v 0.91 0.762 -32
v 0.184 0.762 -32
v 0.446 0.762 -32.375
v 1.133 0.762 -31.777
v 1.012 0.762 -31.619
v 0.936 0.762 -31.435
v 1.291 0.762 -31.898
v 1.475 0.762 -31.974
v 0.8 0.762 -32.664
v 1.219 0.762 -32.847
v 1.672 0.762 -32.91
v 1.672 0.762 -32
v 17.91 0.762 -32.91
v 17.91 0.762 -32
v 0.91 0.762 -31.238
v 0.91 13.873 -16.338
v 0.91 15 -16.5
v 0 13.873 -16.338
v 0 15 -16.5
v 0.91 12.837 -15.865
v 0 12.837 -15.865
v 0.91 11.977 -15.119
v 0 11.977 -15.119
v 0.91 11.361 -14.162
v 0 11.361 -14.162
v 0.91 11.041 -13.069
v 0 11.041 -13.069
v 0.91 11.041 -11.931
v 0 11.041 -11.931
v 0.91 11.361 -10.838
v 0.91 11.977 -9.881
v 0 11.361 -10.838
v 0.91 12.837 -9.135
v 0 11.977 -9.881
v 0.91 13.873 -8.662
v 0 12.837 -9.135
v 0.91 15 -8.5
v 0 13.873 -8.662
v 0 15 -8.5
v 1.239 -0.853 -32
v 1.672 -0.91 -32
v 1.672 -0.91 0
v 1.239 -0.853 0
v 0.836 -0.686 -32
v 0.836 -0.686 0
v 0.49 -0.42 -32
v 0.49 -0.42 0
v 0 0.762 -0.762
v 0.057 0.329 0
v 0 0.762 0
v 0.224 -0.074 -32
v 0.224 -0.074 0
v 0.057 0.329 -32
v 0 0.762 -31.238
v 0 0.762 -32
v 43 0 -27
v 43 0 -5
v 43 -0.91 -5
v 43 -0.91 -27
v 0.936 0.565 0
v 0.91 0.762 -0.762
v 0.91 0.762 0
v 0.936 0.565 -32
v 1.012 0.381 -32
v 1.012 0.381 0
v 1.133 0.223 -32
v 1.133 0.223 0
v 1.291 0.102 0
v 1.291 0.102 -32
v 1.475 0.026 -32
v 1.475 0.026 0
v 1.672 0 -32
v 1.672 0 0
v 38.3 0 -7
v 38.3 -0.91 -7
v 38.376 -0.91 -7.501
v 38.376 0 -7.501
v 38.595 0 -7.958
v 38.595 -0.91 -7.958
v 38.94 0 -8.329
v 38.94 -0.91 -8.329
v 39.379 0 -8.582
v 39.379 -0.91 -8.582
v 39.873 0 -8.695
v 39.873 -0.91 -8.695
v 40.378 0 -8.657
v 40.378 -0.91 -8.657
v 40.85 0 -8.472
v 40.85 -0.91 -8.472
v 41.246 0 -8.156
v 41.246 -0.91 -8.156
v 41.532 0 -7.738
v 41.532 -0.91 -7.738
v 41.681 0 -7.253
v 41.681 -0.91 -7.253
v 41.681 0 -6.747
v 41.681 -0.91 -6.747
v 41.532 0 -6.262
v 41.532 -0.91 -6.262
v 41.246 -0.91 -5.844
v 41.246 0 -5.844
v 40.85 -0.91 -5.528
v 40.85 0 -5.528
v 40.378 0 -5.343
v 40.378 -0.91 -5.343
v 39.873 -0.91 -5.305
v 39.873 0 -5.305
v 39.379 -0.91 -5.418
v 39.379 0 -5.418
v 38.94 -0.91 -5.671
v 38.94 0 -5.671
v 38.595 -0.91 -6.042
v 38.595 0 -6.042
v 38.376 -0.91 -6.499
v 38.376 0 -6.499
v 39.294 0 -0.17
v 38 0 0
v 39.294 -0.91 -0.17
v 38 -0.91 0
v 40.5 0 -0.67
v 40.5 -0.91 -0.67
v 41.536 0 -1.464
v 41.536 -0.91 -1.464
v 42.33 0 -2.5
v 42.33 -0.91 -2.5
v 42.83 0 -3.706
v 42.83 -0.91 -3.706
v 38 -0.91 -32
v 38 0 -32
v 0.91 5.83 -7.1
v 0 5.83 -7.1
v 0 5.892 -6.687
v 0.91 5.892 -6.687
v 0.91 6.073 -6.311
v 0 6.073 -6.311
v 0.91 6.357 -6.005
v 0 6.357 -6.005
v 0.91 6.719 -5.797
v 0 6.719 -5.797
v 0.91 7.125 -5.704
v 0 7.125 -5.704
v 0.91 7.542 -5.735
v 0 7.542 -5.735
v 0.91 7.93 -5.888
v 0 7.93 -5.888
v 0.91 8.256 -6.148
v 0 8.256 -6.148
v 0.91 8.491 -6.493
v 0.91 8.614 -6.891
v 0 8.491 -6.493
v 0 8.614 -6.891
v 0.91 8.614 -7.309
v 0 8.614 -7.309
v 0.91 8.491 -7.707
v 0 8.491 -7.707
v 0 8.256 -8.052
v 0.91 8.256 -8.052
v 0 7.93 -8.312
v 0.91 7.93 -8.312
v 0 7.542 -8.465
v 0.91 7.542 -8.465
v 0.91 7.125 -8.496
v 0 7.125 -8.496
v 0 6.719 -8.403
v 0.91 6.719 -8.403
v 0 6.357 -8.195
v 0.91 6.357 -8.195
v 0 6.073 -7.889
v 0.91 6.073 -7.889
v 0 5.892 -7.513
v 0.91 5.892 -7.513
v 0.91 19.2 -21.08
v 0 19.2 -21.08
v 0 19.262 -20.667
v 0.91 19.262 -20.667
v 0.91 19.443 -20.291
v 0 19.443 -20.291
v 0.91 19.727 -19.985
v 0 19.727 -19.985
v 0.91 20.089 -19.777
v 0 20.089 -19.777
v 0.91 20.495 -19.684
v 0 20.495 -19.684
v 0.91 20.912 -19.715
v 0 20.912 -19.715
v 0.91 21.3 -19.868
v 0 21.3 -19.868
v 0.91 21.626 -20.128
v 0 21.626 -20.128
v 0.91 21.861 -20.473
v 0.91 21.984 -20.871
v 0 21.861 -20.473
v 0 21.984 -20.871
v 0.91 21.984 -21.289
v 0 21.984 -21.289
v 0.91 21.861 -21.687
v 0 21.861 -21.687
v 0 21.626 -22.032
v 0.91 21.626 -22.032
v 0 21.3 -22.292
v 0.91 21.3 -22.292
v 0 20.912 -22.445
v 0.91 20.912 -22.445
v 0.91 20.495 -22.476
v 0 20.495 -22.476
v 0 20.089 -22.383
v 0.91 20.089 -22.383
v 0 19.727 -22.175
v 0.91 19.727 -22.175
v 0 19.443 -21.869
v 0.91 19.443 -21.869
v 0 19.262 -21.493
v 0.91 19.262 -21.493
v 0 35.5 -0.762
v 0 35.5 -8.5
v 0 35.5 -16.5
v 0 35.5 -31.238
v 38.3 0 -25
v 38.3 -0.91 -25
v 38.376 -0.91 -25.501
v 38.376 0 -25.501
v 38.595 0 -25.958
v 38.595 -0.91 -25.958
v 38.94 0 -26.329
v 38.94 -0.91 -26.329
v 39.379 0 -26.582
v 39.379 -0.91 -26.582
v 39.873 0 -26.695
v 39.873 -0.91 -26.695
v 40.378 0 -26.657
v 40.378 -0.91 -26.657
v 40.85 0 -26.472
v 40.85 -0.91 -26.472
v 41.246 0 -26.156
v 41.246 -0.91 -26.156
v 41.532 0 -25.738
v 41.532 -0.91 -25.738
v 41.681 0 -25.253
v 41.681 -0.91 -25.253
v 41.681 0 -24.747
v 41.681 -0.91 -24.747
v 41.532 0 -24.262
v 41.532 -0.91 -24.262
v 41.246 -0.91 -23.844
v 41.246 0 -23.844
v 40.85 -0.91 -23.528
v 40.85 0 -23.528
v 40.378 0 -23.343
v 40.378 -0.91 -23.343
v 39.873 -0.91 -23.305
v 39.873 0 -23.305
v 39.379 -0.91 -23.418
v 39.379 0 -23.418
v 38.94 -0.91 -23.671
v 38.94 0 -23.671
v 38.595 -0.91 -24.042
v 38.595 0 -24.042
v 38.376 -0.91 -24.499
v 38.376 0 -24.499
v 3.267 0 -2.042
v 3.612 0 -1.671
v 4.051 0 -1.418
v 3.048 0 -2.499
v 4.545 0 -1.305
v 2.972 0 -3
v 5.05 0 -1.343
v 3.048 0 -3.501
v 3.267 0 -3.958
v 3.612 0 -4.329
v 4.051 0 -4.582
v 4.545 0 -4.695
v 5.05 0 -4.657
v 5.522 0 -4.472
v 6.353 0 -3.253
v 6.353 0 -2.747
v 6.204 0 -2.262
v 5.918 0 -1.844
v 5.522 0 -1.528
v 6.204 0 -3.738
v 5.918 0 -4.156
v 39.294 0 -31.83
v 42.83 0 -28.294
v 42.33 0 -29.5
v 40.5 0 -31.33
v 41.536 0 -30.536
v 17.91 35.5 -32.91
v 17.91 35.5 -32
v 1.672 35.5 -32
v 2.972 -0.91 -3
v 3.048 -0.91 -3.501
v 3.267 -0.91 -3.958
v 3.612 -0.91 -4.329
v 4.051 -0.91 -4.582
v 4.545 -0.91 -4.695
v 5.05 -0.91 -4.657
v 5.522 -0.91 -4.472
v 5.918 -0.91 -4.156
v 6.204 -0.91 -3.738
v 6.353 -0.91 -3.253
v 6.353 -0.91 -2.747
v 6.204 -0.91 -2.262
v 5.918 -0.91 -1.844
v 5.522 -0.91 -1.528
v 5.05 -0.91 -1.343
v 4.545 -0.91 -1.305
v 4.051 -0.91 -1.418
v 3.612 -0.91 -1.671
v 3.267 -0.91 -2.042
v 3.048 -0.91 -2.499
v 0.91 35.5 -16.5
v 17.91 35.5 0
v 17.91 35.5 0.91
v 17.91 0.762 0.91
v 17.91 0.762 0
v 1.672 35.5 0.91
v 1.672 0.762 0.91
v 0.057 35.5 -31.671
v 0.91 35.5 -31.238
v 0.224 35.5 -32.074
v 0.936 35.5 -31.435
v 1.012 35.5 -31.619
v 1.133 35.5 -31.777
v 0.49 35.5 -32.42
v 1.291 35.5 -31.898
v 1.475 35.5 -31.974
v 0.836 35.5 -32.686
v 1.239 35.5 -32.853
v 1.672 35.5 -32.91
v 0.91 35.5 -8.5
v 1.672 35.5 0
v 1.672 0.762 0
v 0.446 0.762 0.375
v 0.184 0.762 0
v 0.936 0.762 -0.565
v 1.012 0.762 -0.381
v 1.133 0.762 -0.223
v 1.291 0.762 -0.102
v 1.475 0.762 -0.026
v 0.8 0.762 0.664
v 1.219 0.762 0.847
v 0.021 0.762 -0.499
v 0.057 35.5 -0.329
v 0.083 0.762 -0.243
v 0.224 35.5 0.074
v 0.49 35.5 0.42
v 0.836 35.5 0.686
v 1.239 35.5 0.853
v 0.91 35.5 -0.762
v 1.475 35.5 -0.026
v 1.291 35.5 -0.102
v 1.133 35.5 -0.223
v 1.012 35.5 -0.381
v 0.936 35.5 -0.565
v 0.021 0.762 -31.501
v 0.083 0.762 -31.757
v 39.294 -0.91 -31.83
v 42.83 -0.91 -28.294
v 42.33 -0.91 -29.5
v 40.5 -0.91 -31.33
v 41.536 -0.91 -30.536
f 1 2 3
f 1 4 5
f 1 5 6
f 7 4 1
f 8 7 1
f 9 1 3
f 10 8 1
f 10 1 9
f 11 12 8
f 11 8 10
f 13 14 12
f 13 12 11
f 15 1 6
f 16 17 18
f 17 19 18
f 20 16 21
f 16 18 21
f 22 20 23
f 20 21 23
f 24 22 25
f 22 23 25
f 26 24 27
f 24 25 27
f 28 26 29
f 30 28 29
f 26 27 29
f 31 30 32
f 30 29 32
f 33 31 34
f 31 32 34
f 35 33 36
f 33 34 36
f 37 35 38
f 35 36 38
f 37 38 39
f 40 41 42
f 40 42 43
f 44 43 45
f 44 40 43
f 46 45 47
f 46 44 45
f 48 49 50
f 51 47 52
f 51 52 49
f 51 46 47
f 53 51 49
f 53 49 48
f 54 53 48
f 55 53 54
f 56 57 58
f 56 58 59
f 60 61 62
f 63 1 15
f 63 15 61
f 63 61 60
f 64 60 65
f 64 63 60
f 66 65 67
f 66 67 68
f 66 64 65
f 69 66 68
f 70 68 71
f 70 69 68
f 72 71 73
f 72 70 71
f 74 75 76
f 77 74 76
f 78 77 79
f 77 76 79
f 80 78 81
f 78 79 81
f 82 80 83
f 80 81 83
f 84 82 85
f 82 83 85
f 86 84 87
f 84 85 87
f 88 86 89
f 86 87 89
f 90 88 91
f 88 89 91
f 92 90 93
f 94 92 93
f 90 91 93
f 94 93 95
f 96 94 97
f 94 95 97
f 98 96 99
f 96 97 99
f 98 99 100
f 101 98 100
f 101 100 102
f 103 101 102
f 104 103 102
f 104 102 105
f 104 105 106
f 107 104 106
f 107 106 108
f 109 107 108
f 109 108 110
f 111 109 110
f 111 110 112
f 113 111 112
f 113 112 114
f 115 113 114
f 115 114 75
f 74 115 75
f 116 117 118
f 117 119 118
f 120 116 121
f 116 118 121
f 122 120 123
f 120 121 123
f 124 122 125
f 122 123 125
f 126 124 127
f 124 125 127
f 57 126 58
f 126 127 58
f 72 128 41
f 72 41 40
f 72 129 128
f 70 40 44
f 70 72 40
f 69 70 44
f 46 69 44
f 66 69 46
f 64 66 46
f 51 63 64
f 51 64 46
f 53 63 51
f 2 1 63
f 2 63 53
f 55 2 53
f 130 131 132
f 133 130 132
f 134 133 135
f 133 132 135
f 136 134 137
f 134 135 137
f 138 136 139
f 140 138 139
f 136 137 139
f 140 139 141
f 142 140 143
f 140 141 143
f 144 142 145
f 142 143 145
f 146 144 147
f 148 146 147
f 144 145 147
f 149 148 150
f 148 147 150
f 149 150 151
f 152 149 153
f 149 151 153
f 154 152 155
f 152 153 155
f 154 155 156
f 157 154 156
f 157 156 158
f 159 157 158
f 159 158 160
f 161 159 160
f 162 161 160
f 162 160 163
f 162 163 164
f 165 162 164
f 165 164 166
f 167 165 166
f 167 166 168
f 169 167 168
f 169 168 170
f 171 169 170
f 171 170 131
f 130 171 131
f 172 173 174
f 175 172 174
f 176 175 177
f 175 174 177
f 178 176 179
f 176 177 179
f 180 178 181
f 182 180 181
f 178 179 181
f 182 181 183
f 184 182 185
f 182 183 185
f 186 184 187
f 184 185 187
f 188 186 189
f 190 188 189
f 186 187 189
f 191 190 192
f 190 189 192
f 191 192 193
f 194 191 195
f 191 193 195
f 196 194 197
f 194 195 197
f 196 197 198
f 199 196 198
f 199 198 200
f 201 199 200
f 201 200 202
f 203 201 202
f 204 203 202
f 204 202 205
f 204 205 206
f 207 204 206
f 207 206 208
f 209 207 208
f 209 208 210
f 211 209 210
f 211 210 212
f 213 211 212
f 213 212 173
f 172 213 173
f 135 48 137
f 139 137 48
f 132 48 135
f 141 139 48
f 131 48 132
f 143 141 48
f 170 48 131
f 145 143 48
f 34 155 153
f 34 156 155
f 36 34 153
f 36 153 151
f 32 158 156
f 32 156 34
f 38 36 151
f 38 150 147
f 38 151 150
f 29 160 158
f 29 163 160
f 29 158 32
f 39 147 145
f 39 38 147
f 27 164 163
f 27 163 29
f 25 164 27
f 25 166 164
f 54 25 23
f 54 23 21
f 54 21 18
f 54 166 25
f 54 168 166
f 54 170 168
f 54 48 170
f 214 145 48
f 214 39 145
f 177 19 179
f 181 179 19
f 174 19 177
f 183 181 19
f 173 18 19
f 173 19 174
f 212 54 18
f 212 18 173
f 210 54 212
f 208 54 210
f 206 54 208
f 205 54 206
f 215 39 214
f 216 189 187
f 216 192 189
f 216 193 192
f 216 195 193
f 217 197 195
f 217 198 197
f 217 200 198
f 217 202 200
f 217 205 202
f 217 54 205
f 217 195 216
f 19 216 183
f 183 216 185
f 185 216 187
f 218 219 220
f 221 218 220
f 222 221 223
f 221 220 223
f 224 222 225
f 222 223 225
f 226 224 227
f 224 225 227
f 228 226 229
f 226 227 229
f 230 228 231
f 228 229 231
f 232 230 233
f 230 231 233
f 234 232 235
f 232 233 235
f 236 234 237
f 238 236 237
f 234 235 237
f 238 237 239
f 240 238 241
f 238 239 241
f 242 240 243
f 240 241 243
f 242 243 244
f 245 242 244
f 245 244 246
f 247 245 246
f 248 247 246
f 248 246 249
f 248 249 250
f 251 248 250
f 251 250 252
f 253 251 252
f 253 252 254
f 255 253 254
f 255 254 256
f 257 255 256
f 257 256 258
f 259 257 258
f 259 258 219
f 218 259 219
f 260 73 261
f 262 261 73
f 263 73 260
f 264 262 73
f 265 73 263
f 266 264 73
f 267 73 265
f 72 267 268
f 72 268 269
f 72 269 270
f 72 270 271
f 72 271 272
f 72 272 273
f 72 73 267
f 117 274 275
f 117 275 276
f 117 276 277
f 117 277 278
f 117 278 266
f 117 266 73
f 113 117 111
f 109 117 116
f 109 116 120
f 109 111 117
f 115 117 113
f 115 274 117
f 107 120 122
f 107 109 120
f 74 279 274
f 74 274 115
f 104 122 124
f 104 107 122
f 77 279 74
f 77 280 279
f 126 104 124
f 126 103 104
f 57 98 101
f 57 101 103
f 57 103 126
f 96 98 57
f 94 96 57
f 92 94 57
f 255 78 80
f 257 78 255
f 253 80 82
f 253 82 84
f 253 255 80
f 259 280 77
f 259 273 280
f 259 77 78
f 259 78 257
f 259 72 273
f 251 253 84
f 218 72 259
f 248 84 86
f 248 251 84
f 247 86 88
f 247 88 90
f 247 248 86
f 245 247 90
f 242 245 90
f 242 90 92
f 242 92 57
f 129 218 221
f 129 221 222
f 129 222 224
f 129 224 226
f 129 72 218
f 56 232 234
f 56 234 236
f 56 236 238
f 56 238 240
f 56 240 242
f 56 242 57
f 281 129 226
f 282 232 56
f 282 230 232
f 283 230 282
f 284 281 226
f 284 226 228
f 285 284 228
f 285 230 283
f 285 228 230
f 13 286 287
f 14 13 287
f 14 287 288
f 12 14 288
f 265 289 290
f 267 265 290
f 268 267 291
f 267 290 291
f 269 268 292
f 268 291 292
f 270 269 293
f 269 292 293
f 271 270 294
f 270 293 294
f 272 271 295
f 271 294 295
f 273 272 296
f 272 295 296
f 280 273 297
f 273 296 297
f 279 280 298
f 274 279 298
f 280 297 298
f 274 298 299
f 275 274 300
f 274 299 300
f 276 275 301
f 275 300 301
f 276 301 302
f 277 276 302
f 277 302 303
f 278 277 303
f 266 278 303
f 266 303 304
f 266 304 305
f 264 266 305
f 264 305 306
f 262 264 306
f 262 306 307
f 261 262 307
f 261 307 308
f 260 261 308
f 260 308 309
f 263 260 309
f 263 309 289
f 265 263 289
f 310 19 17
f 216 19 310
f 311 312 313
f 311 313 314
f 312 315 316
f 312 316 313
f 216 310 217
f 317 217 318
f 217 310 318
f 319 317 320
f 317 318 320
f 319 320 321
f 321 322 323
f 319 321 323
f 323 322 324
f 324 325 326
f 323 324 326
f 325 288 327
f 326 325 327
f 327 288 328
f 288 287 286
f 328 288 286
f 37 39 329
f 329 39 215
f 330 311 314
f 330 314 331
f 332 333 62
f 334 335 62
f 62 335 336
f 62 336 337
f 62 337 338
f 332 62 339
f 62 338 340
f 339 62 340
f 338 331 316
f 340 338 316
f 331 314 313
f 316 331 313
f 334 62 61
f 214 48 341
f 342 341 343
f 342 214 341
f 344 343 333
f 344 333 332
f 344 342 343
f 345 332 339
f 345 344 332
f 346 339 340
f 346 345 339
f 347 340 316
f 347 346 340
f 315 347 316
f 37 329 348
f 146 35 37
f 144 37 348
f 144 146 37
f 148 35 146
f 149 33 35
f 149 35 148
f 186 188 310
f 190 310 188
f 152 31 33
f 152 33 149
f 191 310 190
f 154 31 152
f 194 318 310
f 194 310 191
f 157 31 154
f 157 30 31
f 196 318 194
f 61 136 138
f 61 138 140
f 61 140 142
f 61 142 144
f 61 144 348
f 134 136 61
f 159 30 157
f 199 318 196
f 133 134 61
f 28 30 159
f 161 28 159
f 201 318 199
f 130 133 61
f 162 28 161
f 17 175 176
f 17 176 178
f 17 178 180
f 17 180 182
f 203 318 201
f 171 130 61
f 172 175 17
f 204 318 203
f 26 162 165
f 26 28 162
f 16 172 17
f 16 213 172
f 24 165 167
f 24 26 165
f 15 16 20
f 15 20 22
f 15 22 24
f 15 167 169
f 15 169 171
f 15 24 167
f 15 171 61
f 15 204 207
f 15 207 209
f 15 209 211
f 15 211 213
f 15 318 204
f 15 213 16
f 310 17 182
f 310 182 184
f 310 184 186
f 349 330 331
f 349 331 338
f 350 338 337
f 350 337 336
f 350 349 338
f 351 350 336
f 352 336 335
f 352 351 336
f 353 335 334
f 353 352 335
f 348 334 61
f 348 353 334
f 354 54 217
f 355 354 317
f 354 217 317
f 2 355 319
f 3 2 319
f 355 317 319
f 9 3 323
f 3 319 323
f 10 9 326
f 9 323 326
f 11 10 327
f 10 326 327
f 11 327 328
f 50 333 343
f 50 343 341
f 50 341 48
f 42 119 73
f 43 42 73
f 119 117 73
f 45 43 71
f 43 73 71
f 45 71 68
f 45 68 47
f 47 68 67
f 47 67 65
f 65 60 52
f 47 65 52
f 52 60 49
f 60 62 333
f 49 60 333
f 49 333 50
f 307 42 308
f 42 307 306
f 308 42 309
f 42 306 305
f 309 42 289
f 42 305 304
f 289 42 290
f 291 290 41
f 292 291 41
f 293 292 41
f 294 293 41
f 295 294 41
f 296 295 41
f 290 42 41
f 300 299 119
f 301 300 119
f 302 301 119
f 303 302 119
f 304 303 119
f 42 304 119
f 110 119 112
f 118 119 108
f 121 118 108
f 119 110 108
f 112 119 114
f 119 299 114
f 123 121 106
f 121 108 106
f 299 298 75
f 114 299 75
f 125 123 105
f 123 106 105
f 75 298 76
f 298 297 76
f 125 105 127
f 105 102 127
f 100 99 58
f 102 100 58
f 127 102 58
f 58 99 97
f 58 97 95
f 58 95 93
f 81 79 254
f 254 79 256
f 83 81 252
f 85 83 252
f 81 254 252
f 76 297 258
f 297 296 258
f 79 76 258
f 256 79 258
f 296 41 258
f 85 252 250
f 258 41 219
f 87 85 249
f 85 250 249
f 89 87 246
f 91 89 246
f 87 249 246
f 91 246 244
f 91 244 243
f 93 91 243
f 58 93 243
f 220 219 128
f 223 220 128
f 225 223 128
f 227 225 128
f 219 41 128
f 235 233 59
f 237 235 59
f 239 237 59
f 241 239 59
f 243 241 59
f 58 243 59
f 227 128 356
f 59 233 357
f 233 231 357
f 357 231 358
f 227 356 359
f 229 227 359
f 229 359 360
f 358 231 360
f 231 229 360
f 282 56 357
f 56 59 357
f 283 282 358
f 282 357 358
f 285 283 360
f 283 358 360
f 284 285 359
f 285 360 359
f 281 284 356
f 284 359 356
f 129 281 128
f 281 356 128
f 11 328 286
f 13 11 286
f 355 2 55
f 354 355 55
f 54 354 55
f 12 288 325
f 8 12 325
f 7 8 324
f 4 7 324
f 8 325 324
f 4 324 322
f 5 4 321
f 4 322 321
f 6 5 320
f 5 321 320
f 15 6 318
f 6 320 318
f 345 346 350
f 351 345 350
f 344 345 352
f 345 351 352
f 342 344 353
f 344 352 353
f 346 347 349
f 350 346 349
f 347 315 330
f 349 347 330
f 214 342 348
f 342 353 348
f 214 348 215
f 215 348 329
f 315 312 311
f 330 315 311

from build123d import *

# Parameters (mm, degrees)
SKETCH1_W                    = 43
SKETCH1_H                    = 32
BASE_FLANGE1_DEPTH           = 0.91
EDGE_FLANGE1_STRIP_W         = 5.164
EDGE_FLANGE1_STRIP_H         = 0.91
EDGE_FLANGE1_STRIP_CUT_DEPTH = 32
EDGE_FLANGE1_DEPTH           = 32
EDGE_FLANGE2_STRIP_W         = 5.164
EDGE_FLANGE2_STRIP_H         = 0.91
EDGE_FLANGE2_STRIP_CUT_DEPTH = 34.738
EDGE_FLANGE2_DEPTH           = 34.738
SKETCH9_R                    = 4
MOTOR_HOLES_DEPTH            = 0.91
M3_CLEARANCE_HOLE3_D         = 3.4
M3_CLEARANCE_HOLE3_DEPTH     = 12
M3_CLEARANCE_HOLE3_TIP       = 1.021463052
SKETCH31_W                   = 8
SKETCH31_H                   = 20.5
CUT_EXTRUDE3_DEPTH           = 10
FILLET2_R                    = 5
SKETCH34_R                   = 1.4
CUT_EXTRUDE4_DEPTH           = 10
SKETCH35_R                   = 1.4
CUT_EXTRUDE5_DEPTH           = 10


# Sheet-metal steps are written as plain solids
with BuildPart() as part:
    # Sketch1 → Base-Flange1 (new body)
    with BuildSketch(Plane(origin=(0, 0, 0), x_dir=(1, 0, 0), z_dir=(0, 1, 0))):
        with Locations((21.5, 16)):
            Rectangle(SKETCH1_W, SKETCH1_H)
    extrude(amount=-BASE_FLANGE1_DEPTH)

    # Edge-Flange1 strip (across the edge) → Edge-Flange1 strip cut (cut)
    with BuildSketch(Plane.XY.offset(-32)):
        with Locations((-0.91, -0.455)):
            Rectangle(EDGE_FLANGE1_STRIP_W, EDGE_FLANGE1_STRIP_H)
    extrude(amount=EDGE_FLANGE1_STRIP_CUT_DEPTH, mode=Mode.SUBTRACT)

    # Edge-Flange1 section (across the edge) → Edge-Flange1 (add)
    with BuildSketch(Plane.XY.offset(-32)):
        with BuildLine():
            Line((0, 0.762), (0, 35.5))
            Line((0, 35.5), (0.91, 35.5))
            Line((0.91, 35.5), (0.91, 0.762))
            ThreePointArc((0.91, 0.762), (1.133184633, 0.223184633), (1.672, 0))
            Line((1.672, 0), (1.672, -0.91))
            ThreePointArc((1.672, -0.91), (0.489717462, -0.420282538), (0, 0.762))
        make_face()
    extrude(amount=EDGE_FLANGE1_DEPTH)

    # Edge-Flange2 strip (across the edge) → Edge-Flange2 strip cut (cut)
    with BuildSketch(Plane(origin=(0.91, 35.5, 0), x_dir=(0, 0, -1), z_dir=(0, -1, 0))):
        with Locations((-1.82, -0.455)):
            Rectangle(EDGE_FLANGE2_STRIP_W, EDGE_FLANGE2_STRIP_H)
    edge_flange2_strip_cut = extrude(amount=EDGE_FLANGE2_STRIP_CUT_DEPTH, mode=Mode.SUBTRACT)

    # Edge-Flange2 section (across the edge) → Edge-Flange2 (add)
    with BuildSketch(Plane(origin=(0.91, 35.5, 0), x_dir=(0, 0, -1), z_dir=(0, -1, 0))):
        with BuildLine():
            Line((-0.91, 0.762), (-0.91, 17))
            Line((-0.91, 17), (0, 17))
            Line((0, 17), (0, 0.762))
            ThreePointArc((0, 0.762), (0.223184633, 0.223184633), (0.762, 0))
            Line((0.762, 0), (0.762, -0.91))
            ThreePointArc((0.762, -0.91), (-0.420282538, -0.420282538), (-0.91, 0.762))
        make_face()
    edge_flange2 = extrude(amount=EDGE_FLANGE2_DEPTH)

    # Sketch9 → Motor Holes (cut)
    with BuildSketch(Plane.ZY):
        with Locations(Location((-12.5, 15, 0), (0, 0, 270))):
            Circle(SKETCH9_R)
    extrude(amount=-MOTOR_HOLES_DEPTH, mode=Mode.SUBTRACT)

    # Mirror4: Edge-Flange2 strip cut, Edge-Flange2 across plane
    add(edge_flange2_strip_cut.mirror(Plane(origin=(0, 0, -16), x_dir=(1, 0, 0), z_dir=(0, 0, -1))), mode=Mode.SUBTRACT)
    add(edge_flange2.mirror(Plane(origin=(0, 0, -16), x_dir=(1, 0, 0), z_dir=(0, 0, -1))))

    # M3 Clearance Hole3
    with Locations(Plane(origin=(0, 0, 0), x_dir=(1, 0, 0), z_dir=(0, 1, 0))):
        with Locations((40, 7), (4.672, 3), (40, 25)):
            Hole(M3_CLEARANCE_HOLE3_D / 2, depth=M3_CLEARANCE_HOLE3_DEPTH)
            with Locations((0, 0, -(M3_CLEARANCE_HOLE3_DEPTH + M3_CLEARANCE_HOLE3_TIP / 2))):  # 118° drill point
                Cone(0, M3_CLEARANCE_HOLE3_D / 2, M3_CLEARANCE_HOLE3_TIP, mode=Mode.SUBTRACT)

    # Sketch31 → Cut-Extrude3 (cut)
    with BuildSketch(Plane.ZY):
        with Locations((-12.5, 25.25)):
            Rectangle(SKETCH31_W, SKETCH31_H)
    extrude(amount=-CUT_EXTRUDE3_DEPTH, mode=Mode.SUBTRACT)

    # Fillet2
    fillet2_edges = [part.edges().sort_by_distance(p)[0] for p in [
        (43, -0.455, -32),
        (43, -0.455, 0),
    ]]
    fillet(fillet2_edges, radius=FILLET2_R)

    # Sketch34 → Cut-Extrude4 (cut)
    with BuildSketch(Plane.ZY):
        with Locations(Location((-7.1, 7.23, 0), (0, 0, 270))):
            Circle(SKETCH34_R)
    extrude(amount=-CUT_EXTRUDE4_DEPTH, mode=Mode.SUBTRACT)

    # Sketch35 → Cut-Extrude5 (cut)
    with BuildSketch(Plane.ZY):
        with Locations(Location((-21.08, 20.6, 0), (0, 0, 270))):
            Circle(SKETCH35_R)
    extrude(amount=-CUT_EXTRUDE5_DEPTH, mode=Mode.SUBTRACT)


solid = part.part
